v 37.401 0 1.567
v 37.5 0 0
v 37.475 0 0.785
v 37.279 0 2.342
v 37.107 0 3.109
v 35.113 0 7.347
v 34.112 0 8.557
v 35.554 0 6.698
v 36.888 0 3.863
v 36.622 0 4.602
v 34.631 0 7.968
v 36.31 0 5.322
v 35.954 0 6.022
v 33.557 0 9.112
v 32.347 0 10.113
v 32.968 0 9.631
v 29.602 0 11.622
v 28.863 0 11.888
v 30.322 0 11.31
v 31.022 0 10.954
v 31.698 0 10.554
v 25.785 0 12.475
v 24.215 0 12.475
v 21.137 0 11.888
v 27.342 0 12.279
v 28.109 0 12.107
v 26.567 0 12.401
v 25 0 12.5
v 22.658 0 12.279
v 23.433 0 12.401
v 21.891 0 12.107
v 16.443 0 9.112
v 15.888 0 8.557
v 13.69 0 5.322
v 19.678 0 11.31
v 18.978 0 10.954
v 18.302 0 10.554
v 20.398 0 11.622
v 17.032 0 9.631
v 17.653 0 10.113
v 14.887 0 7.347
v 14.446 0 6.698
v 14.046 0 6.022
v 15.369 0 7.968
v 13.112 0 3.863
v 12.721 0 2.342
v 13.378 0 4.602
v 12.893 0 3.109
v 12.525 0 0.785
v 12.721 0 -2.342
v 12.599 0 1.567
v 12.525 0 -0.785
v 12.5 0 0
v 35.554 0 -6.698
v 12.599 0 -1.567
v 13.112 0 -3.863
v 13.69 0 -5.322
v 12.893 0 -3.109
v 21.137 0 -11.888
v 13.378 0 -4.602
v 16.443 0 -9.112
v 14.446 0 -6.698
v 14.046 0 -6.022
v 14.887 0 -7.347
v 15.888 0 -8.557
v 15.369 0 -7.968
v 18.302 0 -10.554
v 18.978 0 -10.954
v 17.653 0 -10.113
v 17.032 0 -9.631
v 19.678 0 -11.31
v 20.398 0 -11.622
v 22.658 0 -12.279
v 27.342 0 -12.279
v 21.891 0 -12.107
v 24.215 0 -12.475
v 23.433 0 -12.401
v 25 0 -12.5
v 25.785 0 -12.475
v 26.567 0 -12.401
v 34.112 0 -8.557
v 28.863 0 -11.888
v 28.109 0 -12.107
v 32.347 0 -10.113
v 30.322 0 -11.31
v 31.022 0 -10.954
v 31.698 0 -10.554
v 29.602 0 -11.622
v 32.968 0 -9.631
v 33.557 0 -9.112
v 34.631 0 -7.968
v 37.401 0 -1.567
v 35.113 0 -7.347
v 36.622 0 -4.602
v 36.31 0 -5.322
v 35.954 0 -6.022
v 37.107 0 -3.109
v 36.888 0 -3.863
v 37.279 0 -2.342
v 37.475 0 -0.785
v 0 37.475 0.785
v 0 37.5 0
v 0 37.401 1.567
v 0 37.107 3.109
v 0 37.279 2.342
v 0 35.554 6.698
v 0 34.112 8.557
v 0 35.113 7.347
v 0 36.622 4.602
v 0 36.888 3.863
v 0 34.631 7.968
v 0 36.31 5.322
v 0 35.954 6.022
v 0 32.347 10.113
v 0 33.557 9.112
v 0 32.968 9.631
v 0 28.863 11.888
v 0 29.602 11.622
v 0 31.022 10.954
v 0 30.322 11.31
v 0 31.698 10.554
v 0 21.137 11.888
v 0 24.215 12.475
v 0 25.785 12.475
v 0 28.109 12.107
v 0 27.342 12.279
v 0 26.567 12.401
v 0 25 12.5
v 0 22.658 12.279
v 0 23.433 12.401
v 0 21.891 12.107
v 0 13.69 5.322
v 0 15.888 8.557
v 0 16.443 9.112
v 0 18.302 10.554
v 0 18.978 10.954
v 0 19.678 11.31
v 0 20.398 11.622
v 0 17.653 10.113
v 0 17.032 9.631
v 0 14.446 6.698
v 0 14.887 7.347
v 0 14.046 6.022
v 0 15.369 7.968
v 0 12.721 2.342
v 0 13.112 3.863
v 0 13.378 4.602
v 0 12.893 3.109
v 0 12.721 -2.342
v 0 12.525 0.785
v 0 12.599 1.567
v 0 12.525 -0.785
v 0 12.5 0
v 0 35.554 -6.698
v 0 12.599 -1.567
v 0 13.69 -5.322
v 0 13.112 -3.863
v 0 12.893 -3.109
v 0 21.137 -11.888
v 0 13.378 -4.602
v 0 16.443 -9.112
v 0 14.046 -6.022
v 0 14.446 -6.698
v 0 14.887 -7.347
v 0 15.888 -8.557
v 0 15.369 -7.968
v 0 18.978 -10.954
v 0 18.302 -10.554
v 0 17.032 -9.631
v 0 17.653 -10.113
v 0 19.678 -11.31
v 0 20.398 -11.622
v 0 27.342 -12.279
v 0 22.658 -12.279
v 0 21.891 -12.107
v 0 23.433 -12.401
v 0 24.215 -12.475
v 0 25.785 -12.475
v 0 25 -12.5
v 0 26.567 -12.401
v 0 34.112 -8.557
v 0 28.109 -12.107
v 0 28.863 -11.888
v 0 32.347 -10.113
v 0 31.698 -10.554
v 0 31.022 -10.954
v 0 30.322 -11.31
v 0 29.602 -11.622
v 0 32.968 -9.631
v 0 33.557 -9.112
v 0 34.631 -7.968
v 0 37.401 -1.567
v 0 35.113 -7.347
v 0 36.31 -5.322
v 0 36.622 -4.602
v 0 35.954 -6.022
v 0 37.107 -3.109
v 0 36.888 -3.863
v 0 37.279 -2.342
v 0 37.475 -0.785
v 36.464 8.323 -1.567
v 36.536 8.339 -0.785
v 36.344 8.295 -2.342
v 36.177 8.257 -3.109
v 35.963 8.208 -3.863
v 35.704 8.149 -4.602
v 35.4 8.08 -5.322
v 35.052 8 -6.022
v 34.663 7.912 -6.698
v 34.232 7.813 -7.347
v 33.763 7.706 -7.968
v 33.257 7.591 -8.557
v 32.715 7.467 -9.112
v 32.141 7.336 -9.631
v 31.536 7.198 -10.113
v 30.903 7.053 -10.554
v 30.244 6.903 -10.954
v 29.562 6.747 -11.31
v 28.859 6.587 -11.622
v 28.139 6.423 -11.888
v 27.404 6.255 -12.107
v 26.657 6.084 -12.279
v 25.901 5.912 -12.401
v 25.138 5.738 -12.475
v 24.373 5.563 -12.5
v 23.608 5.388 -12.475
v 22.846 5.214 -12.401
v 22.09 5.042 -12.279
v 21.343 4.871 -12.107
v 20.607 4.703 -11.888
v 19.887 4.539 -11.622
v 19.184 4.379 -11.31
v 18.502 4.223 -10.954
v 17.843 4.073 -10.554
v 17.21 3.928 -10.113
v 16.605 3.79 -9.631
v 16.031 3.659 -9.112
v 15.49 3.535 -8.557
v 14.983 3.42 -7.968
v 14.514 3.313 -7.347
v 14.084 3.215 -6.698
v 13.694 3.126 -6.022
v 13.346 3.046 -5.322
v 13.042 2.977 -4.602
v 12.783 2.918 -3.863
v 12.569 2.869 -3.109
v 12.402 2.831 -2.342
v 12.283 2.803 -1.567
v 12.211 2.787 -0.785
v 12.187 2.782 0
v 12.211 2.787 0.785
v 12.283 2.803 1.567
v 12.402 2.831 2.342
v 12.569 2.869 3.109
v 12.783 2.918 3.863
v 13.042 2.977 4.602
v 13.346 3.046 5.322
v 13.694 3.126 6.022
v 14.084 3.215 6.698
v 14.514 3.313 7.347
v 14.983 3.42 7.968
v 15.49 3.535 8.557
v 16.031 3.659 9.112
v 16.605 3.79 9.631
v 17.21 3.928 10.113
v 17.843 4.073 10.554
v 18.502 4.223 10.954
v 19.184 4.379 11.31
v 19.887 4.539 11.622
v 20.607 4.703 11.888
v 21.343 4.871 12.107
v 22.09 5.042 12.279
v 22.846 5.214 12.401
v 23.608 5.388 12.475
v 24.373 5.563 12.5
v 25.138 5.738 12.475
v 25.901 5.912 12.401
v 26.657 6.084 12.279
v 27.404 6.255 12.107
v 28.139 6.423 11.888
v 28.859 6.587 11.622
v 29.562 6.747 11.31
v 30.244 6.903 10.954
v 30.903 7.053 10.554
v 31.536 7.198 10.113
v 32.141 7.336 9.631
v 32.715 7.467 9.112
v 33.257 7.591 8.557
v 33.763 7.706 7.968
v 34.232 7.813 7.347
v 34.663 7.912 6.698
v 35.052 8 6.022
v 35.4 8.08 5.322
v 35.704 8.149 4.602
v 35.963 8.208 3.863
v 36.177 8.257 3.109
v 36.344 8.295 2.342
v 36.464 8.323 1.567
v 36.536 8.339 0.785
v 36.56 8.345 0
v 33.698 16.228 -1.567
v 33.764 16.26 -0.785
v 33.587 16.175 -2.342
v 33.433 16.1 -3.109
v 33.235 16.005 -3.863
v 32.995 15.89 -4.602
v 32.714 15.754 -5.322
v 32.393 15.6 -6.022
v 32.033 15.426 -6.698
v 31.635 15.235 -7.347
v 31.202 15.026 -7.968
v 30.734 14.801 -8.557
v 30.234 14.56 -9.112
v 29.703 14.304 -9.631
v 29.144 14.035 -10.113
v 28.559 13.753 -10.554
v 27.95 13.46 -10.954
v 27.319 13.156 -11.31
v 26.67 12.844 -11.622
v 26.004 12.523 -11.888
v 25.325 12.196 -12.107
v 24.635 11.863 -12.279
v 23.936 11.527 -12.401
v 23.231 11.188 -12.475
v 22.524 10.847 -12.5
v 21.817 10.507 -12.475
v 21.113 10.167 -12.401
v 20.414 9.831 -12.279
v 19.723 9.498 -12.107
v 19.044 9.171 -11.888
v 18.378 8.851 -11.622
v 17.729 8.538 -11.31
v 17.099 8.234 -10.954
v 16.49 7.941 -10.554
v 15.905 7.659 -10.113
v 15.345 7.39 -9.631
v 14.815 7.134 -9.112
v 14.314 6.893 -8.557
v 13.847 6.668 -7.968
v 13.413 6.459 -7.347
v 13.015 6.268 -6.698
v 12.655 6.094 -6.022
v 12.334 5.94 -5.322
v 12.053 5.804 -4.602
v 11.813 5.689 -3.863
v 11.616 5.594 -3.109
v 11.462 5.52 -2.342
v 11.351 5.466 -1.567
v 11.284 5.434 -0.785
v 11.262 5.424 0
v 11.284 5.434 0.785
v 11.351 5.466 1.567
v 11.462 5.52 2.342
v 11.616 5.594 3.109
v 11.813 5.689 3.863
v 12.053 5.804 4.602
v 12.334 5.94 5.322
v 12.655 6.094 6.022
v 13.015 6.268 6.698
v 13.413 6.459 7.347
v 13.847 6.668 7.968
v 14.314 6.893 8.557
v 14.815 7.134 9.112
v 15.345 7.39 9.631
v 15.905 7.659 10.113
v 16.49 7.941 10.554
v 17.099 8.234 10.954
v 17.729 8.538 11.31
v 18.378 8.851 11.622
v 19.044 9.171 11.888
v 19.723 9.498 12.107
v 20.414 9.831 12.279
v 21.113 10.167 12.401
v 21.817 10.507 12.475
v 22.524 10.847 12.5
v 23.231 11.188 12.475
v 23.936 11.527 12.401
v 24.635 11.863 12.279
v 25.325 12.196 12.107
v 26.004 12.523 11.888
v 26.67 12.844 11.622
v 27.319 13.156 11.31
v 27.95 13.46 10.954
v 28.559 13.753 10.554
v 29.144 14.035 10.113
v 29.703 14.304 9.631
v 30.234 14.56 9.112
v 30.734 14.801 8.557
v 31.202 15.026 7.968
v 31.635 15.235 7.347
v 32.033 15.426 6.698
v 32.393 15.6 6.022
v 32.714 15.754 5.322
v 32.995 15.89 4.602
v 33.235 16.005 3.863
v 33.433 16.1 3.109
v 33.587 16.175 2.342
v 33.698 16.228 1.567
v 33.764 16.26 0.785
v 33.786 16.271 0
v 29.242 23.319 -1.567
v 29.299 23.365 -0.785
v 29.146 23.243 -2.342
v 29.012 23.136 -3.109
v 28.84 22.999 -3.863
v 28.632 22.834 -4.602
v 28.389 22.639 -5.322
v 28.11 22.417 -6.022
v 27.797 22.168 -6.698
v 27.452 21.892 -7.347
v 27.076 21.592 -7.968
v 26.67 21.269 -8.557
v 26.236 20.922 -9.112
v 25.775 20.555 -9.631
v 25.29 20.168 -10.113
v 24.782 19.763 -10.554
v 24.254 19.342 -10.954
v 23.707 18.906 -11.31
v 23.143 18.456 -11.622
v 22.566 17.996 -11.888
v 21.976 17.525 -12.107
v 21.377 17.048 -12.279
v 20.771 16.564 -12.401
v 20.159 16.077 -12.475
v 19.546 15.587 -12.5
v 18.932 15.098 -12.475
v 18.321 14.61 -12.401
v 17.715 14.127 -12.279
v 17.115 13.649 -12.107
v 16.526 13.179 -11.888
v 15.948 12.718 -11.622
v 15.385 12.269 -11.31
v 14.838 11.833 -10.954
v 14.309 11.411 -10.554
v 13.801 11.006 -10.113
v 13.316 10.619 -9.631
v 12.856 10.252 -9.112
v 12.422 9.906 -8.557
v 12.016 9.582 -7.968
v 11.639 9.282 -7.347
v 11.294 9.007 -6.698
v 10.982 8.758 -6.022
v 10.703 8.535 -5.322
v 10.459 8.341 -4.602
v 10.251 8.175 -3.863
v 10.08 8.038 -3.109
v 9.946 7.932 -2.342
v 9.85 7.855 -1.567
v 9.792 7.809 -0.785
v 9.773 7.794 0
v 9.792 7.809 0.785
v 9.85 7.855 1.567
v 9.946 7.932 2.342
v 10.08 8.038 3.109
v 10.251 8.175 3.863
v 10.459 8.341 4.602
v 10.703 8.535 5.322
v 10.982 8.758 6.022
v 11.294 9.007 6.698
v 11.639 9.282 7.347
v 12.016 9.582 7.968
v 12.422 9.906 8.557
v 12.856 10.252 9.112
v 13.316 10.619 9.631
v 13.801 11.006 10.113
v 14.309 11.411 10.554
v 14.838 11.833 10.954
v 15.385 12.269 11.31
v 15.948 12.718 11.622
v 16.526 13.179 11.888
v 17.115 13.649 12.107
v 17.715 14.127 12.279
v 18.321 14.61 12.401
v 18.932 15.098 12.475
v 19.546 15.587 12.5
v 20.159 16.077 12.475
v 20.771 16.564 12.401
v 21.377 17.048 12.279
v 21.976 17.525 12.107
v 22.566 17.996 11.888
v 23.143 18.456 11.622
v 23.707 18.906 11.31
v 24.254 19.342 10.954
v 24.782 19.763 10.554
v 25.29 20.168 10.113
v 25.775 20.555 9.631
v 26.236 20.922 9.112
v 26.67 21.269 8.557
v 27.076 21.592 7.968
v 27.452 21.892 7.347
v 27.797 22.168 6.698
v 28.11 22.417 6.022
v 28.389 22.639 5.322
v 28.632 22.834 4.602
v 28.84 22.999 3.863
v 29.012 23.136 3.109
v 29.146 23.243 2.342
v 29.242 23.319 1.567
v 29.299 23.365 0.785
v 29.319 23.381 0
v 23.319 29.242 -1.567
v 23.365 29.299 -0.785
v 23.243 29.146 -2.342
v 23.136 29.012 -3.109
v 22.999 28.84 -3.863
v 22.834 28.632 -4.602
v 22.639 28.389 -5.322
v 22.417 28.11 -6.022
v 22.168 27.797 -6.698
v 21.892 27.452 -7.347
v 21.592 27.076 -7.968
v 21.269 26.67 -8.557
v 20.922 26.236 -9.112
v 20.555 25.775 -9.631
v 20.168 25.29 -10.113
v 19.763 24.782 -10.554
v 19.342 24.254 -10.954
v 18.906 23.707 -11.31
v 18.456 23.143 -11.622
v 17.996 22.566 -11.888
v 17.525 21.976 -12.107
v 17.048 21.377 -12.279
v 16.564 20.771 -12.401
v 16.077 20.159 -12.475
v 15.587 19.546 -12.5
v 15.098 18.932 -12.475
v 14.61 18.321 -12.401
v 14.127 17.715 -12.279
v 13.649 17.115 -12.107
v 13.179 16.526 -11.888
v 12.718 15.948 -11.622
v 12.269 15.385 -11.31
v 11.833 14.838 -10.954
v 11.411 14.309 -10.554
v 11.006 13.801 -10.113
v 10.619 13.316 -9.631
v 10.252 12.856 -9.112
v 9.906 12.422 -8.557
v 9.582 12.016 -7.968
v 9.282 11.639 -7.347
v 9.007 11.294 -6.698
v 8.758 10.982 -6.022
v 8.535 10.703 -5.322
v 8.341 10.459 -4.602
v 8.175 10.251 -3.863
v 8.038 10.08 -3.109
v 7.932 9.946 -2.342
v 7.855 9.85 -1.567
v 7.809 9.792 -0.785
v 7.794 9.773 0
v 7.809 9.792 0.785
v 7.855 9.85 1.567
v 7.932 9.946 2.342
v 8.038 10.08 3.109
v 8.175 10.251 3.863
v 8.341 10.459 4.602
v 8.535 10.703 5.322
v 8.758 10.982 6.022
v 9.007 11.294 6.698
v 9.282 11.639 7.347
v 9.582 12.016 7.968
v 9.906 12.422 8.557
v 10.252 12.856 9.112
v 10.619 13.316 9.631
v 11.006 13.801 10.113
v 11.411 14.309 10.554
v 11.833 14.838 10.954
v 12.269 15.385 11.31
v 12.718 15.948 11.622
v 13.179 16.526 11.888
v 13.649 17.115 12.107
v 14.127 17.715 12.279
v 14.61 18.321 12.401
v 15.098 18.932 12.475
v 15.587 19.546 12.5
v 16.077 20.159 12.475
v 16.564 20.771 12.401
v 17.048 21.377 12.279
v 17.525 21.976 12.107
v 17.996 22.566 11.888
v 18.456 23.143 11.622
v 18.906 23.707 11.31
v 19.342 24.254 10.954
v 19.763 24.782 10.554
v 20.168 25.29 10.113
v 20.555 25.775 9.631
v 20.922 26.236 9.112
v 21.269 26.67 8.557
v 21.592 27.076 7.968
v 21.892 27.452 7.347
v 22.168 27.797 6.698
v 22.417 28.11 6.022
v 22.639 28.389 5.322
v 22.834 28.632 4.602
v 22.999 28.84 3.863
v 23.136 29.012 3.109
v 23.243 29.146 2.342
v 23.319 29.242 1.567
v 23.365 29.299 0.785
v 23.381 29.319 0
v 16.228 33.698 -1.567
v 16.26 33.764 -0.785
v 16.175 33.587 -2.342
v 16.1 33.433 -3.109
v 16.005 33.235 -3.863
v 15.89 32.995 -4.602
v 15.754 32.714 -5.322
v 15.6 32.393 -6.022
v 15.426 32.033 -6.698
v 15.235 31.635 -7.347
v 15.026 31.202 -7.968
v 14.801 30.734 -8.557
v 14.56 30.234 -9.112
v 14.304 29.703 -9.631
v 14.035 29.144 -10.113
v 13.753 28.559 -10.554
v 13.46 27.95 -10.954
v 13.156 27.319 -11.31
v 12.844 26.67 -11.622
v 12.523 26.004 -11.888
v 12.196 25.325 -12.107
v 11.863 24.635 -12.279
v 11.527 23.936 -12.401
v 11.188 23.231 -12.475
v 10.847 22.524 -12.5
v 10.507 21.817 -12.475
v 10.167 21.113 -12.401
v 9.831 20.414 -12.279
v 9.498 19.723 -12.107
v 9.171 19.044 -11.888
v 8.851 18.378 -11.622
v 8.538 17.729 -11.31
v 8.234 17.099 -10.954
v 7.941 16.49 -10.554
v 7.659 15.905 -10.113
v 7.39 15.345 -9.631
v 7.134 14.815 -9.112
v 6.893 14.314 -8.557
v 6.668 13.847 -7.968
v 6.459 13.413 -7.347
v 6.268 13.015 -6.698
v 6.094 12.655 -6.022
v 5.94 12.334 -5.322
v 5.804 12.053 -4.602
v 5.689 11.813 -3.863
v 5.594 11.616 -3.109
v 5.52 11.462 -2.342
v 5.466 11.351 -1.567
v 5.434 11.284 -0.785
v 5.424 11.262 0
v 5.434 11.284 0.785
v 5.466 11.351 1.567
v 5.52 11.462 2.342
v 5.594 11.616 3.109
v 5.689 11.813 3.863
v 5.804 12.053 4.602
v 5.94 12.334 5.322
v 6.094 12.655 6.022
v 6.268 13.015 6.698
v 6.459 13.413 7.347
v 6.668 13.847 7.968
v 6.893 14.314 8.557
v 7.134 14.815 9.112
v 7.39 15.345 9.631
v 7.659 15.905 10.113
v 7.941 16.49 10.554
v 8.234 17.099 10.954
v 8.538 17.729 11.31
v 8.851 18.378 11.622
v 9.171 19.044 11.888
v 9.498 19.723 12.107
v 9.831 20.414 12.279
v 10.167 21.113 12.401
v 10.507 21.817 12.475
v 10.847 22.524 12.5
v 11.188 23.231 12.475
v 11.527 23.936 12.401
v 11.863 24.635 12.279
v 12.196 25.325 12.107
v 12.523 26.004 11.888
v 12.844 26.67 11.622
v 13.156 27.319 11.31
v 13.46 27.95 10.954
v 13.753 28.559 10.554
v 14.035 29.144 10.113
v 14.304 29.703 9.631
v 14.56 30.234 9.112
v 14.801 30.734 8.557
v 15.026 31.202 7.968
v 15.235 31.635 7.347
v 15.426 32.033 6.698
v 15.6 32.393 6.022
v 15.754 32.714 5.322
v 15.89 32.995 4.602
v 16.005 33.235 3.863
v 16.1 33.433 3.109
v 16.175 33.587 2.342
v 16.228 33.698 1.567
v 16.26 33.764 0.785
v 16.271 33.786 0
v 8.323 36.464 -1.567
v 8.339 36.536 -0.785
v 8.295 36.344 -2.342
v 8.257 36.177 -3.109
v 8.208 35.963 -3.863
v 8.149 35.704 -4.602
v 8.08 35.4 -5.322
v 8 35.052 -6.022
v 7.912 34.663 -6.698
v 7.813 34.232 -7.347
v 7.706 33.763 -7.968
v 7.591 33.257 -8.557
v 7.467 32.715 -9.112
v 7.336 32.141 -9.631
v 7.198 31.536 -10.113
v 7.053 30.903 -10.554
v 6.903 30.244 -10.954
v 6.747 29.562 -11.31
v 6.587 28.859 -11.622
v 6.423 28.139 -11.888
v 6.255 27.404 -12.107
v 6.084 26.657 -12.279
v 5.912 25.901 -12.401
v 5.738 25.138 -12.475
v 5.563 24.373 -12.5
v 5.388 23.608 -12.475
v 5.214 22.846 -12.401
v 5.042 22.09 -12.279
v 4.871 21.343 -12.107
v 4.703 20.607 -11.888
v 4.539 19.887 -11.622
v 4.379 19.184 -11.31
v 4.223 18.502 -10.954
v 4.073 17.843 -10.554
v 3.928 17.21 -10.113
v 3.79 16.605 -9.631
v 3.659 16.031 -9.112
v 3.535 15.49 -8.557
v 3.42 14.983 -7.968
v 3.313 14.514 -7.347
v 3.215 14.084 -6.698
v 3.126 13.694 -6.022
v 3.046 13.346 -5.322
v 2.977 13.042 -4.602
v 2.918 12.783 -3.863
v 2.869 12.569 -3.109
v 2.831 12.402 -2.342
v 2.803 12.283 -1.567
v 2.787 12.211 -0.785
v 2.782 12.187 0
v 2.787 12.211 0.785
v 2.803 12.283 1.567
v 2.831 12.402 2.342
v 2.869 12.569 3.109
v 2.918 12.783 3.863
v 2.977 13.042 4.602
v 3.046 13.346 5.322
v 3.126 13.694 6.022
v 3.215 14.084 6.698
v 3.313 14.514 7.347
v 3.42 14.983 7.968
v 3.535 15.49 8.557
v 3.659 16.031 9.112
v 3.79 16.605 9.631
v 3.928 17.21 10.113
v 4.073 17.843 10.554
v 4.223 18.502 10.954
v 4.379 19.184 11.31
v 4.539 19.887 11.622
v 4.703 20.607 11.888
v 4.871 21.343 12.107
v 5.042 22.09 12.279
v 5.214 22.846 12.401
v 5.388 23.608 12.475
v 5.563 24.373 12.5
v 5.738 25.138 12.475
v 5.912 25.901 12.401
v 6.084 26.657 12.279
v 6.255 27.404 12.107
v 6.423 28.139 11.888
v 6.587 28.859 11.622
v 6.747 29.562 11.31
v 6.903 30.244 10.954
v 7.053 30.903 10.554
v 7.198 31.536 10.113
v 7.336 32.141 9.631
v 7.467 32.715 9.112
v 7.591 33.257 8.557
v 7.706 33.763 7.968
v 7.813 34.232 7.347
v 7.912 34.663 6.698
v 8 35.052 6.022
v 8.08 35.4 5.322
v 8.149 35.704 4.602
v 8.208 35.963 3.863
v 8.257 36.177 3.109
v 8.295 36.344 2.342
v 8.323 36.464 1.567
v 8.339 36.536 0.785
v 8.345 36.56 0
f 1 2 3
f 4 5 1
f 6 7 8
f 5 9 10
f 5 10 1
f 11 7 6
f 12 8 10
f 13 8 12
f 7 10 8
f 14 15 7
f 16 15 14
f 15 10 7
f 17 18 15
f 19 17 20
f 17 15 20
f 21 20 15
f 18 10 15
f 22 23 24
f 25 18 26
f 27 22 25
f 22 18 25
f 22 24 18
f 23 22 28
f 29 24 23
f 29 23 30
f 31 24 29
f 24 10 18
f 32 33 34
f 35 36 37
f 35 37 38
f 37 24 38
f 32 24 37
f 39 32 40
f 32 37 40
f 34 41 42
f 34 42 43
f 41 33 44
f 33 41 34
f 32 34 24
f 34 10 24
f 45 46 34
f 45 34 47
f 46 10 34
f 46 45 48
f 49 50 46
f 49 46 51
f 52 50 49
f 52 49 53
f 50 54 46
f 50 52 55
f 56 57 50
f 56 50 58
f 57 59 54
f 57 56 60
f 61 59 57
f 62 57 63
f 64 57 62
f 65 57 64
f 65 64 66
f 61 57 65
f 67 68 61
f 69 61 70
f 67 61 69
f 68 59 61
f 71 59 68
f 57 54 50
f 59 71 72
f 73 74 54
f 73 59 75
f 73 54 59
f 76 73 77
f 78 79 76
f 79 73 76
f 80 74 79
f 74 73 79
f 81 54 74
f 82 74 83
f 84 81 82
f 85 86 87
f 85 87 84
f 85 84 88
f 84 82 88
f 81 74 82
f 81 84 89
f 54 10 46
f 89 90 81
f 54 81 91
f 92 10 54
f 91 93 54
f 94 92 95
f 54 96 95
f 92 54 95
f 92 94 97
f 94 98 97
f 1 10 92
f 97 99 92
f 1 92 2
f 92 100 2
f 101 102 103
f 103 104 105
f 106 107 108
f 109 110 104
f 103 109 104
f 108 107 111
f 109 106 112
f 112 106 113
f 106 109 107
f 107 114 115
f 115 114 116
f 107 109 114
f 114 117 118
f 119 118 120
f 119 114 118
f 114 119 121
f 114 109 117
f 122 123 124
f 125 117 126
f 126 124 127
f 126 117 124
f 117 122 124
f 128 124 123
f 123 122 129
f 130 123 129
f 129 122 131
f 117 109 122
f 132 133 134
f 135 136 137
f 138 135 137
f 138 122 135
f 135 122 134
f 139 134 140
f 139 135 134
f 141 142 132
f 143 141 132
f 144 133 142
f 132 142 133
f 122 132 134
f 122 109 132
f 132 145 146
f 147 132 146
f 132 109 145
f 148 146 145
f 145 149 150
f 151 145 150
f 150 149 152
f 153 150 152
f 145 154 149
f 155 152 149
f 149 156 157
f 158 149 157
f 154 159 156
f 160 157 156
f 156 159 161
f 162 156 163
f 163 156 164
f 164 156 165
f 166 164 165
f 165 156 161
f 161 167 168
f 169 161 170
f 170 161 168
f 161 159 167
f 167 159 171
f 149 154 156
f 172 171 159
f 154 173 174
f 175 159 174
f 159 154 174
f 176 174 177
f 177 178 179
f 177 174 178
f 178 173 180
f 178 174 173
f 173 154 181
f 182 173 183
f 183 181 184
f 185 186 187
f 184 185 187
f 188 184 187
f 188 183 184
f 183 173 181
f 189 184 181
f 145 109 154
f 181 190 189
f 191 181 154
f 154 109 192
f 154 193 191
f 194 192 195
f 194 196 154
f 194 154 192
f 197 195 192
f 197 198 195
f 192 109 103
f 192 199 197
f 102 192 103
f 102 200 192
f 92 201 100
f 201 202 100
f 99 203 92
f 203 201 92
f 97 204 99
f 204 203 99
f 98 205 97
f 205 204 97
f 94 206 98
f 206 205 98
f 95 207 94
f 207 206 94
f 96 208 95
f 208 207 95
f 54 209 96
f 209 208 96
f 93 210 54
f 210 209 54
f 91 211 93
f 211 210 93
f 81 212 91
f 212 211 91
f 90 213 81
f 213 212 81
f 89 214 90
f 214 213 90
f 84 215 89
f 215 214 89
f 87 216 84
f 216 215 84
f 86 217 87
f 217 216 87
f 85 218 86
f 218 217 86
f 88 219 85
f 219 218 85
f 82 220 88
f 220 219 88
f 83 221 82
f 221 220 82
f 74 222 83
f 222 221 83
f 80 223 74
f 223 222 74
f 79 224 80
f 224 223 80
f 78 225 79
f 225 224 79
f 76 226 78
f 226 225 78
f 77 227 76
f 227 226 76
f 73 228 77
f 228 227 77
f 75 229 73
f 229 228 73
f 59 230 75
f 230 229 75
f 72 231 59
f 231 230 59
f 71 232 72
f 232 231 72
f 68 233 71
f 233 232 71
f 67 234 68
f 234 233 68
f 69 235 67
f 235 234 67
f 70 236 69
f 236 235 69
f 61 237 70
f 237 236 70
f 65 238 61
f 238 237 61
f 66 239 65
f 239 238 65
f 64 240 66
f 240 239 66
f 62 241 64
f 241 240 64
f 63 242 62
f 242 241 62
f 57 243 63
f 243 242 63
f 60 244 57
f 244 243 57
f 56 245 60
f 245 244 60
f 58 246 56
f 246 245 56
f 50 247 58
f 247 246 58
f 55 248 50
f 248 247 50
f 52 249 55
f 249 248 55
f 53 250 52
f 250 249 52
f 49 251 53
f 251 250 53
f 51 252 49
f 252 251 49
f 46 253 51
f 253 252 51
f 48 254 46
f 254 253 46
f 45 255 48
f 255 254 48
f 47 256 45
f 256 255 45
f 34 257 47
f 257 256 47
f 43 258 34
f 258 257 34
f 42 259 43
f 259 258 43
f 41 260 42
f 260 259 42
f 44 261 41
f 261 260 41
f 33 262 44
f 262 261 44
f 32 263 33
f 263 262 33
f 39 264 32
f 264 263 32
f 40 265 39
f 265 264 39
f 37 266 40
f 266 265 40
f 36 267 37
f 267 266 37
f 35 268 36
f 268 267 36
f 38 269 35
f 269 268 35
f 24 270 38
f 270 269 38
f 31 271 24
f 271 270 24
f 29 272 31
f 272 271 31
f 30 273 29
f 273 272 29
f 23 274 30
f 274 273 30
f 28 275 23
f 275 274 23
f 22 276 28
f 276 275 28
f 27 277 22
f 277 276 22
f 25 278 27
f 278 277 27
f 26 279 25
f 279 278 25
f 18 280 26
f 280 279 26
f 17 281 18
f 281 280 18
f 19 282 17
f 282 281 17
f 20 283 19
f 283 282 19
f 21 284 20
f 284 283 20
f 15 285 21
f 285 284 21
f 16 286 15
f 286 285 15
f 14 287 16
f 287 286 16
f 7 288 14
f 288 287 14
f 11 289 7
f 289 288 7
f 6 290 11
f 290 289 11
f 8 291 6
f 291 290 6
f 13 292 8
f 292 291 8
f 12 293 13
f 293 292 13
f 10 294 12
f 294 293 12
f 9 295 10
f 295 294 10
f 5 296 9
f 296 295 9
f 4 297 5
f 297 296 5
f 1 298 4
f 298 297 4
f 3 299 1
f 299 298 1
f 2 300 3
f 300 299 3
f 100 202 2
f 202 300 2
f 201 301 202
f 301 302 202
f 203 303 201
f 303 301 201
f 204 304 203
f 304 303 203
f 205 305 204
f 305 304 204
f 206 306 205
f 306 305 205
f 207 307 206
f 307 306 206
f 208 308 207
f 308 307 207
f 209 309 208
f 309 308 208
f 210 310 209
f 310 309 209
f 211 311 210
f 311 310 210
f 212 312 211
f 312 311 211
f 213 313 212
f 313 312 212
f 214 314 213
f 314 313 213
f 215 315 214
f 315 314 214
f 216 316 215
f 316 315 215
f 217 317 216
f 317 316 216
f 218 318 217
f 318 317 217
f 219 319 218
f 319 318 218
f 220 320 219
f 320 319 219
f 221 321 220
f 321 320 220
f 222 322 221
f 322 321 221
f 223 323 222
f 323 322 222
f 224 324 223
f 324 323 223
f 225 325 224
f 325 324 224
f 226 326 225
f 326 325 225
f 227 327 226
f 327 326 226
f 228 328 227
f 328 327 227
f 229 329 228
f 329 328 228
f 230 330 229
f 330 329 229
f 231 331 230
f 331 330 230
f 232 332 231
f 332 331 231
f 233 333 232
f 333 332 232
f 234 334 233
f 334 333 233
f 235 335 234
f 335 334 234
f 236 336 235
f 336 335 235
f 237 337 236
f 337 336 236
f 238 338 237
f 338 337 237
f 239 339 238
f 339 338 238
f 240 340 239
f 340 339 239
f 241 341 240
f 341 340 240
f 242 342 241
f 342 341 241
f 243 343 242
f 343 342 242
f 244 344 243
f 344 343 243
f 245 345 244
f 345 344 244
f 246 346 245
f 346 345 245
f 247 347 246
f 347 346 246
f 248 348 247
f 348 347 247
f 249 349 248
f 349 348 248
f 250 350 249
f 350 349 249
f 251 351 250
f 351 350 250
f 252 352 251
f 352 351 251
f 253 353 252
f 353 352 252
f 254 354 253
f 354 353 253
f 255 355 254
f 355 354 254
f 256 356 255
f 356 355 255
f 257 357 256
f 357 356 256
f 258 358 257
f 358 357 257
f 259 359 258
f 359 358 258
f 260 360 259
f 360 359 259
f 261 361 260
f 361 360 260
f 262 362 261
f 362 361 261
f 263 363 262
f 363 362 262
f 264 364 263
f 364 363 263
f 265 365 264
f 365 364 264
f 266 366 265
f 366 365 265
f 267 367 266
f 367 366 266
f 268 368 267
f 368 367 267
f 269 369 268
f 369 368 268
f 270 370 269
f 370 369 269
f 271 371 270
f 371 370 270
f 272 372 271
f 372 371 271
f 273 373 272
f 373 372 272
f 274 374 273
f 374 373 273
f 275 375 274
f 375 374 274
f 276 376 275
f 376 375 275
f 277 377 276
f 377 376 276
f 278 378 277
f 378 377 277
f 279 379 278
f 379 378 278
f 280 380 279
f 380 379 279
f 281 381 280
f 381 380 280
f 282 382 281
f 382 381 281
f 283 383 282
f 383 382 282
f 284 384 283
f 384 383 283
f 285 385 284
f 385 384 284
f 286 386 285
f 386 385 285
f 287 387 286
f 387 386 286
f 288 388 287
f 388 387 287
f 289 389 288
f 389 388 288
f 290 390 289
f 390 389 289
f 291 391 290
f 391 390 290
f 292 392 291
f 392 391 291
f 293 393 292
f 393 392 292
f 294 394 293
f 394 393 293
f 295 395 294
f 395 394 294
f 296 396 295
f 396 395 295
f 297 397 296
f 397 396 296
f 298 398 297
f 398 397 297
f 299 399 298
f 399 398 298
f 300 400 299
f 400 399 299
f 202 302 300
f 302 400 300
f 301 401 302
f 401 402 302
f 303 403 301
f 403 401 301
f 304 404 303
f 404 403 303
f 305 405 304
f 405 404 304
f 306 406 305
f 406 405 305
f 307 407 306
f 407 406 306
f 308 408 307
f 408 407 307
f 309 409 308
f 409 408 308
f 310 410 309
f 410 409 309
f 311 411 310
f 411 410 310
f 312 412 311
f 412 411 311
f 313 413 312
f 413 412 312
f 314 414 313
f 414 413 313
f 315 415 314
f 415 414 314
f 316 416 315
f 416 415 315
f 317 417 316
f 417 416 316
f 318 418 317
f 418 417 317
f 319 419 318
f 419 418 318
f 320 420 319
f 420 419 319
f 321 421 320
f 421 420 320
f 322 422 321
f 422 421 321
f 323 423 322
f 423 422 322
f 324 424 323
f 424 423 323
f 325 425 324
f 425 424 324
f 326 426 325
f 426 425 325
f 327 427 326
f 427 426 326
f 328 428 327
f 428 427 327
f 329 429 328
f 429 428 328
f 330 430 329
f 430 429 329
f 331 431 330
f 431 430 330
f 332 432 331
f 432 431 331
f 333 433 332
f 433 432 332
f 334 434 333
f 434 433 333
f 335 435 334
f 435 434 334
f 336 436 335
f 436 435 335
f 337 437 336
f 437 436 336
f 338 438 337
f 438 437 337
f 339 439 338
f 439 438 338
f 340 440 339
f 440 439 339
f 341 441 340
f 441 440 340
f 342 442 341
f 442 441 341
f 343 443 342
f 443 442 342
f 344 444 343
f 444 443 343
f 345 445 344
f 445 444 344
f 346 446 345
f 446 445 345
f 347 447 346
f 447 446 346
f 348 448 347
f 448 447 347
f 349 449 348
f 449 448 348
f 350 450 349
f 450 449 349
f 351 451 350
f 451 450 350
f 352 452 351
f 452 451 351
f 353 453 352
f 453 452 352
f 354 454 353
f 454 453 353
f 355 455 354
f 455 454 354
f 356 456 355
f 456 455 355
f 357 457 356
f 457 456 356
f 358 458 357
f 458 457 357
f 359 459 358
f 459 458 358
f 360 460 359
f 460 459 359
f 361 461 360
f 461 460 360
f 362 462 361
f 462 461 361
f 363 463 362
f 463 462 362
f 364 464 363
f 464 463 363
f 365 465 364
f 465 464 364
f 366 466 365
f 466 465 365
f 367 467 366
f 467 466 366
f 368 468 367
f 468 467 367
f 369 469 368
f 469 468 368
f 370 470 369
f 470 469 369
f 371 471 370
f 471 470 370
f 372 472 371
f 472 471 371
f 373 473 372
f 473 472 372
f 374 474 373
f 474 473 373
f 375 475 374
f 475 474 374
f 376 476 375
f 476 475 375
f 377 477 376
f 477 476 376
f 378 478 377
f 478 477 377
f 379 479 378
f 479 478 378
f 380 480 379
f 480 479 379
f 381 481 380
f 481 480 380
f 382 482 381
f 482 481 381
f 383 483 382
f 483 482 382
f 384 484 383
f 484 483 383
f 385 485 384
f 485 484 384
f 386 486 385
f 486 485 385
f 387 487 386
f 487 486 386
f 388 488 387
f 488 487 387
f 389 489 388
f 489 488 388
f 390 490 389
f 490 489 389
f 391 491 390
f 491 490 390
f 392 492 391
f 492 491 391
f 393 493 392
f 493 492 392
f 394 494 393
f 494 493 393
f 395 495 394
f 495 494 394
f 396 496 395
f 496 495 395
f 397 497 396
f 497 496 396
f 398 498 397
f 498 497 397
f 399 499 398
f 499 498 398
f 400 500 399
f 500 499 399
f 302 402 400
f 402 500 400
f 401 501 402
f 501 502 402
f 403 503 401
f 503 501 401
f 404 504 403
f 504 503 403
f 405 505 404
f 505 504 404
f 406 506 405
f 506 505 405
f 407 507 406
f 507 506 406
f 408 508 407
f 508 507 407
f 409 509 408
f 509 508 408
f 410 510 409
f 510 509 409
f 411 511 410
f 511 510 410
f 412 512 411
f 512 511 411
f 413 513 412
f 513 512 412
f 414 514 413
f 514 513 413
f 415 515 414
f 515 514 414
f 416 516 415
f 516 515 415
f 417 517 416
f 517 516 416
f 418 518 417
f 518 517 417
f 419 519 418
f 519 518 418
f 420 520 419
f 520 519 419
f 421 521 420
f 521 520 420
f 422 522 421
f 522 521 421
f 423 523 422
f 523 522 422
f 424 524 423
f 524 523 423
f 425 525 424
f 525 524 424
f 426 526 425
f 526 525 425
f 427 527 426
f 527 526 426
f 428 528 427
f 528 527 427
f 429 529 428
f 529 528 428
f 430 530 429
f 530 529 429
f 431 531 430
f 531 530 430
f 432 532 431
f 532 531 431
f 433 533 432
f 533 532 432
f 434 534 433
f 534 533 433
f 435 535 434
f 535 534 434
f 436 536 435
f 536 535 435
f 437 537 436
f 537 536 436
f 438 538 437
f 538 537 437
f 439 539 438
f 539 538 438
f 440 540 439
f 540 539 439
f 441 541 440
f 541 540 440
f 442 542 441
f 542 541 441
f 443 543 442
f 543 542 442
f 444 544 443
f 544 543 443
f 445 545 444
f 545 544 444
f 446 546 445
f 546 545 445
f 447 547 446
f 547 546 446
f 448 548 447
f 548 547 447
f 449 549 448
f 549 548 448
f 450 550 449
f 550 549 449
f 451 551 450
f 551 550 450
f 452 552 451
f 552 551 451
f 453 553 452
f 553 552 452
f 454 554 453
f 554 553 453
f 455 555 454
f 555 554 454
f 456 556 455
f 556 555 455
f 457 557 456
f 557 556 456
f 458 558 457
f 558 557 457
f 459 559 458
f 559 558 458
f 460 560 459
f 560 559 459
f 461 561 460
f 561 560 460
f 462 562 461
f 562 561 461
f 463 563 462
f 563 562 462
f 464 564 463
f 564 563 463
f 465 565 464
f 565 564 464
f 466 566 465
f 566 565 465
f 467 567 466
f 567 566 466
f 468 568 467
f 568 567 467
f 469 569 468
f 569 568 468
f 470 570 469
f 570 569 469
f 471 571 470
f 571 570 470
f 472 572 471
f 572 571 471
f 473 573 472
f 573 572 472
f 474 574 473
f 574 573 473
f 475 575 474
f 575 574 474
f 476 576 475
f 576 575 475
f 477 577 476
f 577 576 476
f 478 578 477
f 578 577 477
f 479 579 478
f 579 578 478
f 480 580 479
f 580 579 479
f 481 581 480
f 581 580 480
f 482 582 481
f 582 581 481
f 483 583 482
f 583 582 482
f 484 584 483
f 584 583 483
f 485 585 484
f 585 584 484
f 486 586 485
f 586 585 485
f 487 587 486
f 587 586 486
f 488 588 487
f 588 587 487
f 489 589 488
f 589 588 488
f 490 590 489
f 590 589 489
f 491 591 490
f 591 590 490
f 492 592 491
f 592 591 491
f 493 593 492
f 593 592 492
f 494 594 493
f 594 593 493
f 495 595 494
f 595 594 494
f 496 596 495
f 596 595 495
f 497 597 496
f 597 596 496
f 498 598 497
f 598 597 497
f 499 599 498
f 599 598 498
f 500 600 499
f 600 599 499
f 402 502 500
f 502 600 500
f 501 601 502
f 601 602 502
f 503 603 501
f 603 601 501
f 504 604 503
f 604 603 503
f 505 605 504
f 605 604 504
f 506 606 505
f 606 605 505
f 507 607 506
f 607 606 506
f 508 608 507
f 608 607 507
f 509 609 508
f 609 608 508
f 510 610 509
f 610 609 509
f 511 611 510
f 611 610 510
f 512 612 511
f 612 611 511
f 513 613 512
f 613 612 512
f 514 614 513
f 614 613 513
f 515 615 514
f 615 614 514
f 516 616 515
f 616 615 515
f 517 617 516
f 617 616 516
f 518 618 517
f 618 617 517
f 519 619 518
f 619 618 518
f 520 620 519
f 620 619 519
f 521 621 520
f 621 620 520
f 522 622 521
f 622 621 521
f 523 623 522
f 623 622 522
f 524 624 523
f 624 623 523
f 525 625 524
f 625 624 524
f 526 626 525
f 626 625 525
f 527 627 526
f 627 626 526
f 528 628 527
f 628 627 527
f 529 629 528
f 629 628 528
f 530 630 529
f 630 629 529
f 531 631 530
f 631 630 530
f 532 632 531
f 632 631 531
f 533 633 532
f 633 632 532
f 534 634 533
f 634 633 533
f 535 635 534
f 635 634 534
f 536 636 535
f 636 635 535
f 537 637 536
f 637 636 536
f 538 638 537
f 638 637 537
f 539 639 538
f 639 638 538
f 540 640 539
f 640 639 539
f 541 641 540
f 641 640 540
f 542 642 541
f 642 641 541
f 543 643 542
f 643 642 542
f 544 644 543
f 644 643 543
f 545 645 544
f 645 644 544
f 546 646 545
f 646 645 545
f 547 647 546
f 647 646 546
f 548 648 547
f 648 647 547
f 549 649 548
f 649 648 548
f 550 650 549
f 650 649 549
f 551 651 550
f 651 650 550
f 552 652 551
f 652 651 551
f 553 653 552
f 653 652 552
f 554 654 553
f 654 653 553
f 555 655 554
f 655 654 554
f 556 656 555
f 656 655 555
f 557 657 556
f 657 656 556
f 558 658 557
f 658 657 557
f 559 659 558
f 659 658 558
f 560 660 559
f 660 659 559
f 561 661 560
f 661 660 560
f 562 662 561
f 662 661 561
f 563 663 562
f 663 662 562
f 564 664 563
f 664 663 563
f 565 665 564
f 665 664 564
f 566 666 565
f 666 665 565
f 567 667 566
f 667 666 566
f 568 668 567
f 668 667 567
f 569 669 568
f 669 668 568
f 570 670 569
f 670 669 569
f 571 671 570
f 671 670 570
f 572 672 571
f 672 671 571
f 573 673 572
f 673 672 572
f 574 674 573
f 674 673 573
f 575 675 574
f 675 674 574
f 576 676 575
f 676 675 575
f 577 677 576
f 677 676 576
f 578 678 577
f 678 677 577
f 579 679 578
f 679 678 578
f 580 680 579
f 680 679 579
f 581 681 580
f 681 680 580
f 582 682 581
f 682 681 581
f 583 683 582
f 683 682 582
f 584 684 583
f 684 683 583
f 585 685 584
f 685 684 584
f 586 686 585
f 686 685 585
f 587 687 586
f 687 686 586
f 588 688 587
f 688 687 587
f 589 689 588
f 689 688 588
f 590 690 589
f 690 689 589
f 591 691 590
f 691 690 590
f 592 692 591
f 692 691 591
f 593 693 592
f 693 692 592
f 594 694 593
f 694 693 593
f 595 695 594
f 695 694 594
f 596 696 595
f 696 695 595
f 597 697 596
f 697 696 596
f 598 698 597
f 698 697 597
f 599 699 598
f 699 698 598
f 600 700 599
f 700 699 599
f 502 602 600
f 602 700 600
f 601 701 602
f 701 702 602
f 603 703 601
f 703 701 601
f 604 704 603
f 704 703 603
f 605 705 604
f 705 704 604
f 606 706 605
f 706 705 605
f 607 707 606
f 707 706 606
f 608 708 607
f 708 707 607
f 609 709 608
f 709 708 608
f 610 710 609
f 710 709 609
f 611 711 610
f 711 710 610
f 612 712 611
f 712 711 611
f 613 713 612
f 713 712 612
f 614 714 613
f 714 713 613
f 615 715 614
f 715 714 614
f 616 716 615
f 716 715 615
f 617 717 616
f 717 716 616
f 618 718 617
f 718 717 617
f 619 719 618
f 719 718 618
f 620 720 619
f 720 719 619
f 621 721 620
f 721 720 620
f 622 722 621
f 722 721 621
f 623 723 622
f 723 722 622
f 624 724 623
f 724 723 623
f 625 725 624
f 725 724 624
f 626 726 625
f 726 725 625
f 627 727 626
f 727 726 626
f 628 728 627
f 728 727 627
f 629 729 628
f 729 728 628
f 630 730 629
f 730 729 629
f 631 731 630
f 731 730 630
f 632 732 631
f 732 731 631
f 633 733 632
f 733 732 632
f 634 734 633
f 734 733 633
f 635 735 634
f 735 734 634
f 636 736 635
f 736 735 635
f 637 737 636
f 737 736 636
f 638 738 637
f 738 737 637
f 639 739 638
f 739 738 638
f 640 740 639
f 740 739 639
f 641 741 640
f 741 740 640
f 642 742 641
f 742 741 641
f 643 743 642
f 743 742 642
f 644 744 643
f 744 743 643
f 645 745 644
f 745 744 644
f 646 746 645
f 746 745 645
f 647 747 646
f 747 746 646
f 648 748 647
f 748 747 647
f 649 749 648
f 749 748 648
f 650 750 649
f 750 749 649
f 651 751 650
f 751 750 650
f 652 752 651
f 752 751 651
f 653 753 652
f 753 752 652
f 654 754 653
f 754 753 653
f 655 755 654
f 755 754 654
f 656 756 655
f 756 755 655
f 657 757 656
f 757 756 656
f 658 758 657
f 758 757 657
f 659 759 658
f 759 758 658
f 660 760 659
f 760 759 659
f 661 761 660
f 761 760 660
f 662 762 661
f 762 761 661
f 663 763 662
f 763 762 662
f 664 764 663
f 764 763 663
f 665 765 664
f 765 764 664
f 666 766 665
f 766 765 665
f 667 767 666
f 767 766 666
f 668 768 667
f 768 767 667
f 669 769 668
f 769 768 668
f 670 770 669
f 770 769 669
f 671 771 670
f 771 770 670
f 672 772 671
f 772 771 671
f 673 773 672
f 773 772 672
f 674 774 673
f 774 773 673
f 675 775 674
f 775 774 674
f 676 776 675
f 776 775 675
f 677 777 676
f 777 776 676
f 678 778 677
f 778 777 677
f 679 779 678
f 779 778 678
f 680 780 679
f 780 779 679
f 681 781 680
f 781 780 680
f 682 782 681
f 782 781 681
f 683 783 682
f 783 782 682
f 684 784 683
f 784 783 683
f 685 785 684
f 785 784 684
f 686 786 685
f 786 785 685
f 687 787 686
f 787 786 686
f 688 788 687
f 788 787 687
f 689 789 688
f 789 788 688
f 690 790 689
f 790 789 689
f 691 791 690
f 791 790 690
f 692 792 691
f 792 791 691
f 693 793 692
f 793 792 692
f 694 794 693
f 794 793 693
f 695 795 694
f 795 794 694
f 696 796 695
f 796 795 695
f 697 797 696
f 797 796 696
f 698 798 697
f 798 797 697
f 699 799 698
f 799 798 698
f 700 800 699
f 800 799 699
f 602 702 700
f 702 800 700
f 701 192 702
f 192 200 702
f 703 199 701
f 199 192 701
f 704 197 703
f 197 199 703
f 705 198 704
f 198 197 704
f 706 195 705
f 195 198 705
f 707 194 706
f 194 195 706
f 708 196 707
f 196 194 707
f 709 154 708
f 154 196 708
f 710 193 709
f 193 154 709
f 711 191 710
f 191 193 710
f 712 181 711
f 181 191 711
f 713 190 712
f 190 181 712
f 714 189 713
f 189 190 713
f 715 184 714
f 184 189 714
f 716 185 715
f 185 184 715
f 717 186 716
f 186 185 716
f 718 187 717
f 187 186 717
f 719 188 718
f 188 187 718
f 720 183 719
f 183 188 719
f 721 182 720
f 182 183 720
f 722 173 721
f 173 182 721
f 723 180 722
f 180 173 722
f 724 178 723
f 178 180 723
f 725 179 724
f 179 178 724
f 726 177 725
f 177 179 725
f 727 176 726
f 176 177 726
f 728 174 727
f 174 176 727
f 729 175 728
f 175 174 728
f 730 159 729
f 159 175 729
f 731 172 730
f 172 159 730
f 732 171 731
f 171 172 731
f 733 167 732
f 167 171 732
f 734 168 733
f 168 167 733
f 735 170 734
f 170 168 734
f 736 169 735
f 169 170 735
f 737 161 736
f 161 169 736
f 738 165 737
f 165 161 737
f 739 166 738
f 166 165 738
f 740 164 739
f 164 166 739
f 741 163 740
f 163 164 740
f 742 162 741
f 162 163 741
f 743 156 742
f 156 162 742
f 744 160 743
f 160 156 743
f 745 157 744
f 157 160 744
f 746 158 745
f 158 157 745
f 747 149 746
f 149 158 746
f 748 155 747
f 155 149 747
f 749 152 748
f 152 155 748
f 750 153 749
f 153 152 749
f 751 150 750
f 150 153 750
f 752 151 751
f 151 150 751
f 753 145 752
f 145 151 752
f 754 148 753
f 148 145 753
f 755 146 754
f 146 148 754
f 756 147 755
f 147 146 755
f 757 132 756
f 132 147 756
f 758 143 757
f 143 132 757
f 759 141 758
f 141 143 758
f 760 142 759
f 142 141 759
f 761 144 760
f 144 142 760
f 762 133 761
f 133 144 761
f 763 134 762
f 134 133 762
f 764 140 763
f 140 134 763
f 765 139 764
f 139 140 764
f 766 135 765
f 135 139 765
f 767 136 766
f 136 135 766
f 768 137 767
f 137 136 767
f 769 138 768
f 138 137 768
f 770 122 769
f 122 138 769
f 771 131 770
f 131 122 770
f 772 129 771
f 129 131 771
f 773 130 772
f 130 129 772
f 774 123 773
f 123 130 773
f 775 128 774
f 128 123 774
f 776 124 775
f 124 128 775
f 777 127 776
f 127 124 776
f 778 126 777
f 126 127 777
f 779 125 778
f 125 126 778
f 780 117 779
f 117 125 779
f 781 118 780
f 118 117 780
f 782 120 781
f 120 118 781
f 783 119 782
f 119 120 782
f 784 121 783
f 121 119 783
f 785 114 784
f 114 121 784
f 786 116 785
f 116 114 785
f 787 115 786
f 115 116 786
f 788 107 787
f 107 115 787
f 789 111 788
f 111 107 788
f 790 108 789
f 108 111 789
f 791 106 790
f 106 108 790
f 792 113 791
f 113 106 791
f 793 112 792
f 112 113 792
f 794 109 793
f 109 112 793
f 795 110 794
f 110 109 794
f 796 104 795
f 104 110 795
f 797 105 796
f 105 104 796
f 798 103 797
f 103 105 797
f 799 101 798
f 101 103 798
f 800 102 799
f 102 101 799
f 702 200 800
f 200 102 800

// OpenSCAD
// file: abmessungen.scad
stahlrohr_materialstaerke=2;
rohr_durchmesser=25;
traeger_hoehe=810;
traeger_breite=1515;
mittelstrebe_position=traeger_hoehe/2.3;

gepaeckbruecke_hoehe=mittelstrebe_position;
gepaeckbruecke_tiefe=mittelstrebe_position;
gepaeckbruecke_breite=traeger_breite;


laengsstrebe_laenge=gepaeckbruecke_hoehe-2*rohr_durchmesser;

aufnahme_stift_hoehe=56;
aufnahme_stift_durchmesser=10;
// main file
module stangenecke () {
include <abmessungen.scad>;    
// Stange gebogen 90°
rotate_extrude(angle=90)
translate([rohr_durchmesser,0,0])
//scale([1,2])
circle(d=rohr_durchmesser, $fn=100);
}

stangenecke();

//cylinder(traeger_hoehe,d=rohr_durchmesser);    
    
// translate([traeger_breite,0,0])
// cylinder(traeger_hoehe,d=rohr_durchmesser);
